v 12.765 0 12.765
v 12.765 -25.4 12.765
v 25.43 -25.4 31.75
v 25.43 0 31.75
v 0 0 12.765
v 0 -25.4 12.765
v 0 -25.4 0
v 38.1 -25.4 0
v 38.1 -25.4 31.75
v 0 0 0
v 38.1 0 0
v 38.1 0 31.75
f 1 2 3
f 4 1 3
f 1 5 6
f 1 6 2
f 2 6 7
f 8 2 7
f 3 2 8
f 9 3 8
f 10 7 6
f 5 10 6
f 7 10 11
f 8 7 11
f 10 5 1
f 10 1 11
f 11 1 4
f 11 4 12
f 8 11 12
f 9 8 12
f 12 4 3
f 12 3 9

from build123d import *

# Parameters (mm, degrees)
F0_W     = 38.1
F0_H     = 31.75
F1_DEPTH = 25.4
F3_DEPTH = 25.4
F5_DEPTH = 25.401


with BuildPart() as f1:
    # F0 (on Front) → F1 (new body)
    with BuildSketch(Plane.XZ):
        with Locations((19.05, 15.875)):
            Rectangle(F0_W, F0_H)
    extrude(amount=F1_DEPTH)

    # F2 (on Front) → F3 (cut)
    with BuildSketch(Plane.XZ):
        Polygon((23.017952, 8.342751), (23.017952, 31.260189), (0, 12.564384), (0, 8.342751), align=None)
    extrude(amount=-F3_DEPTH, mode=Mode.SUBTRACT)

    # F4 (on face) → F5 (cut, through all)
    with BuildSketch(Plane.XZ.offset(25.4)):
        Polygon((0, 31.75), (0, 12.765414), (12.765414, 12.765414), (25.430316, 31.75), align=None)
    extrude(amount=-F5_DEPTH, mode=Mode.SUBTRACT)


solid = f1.part
